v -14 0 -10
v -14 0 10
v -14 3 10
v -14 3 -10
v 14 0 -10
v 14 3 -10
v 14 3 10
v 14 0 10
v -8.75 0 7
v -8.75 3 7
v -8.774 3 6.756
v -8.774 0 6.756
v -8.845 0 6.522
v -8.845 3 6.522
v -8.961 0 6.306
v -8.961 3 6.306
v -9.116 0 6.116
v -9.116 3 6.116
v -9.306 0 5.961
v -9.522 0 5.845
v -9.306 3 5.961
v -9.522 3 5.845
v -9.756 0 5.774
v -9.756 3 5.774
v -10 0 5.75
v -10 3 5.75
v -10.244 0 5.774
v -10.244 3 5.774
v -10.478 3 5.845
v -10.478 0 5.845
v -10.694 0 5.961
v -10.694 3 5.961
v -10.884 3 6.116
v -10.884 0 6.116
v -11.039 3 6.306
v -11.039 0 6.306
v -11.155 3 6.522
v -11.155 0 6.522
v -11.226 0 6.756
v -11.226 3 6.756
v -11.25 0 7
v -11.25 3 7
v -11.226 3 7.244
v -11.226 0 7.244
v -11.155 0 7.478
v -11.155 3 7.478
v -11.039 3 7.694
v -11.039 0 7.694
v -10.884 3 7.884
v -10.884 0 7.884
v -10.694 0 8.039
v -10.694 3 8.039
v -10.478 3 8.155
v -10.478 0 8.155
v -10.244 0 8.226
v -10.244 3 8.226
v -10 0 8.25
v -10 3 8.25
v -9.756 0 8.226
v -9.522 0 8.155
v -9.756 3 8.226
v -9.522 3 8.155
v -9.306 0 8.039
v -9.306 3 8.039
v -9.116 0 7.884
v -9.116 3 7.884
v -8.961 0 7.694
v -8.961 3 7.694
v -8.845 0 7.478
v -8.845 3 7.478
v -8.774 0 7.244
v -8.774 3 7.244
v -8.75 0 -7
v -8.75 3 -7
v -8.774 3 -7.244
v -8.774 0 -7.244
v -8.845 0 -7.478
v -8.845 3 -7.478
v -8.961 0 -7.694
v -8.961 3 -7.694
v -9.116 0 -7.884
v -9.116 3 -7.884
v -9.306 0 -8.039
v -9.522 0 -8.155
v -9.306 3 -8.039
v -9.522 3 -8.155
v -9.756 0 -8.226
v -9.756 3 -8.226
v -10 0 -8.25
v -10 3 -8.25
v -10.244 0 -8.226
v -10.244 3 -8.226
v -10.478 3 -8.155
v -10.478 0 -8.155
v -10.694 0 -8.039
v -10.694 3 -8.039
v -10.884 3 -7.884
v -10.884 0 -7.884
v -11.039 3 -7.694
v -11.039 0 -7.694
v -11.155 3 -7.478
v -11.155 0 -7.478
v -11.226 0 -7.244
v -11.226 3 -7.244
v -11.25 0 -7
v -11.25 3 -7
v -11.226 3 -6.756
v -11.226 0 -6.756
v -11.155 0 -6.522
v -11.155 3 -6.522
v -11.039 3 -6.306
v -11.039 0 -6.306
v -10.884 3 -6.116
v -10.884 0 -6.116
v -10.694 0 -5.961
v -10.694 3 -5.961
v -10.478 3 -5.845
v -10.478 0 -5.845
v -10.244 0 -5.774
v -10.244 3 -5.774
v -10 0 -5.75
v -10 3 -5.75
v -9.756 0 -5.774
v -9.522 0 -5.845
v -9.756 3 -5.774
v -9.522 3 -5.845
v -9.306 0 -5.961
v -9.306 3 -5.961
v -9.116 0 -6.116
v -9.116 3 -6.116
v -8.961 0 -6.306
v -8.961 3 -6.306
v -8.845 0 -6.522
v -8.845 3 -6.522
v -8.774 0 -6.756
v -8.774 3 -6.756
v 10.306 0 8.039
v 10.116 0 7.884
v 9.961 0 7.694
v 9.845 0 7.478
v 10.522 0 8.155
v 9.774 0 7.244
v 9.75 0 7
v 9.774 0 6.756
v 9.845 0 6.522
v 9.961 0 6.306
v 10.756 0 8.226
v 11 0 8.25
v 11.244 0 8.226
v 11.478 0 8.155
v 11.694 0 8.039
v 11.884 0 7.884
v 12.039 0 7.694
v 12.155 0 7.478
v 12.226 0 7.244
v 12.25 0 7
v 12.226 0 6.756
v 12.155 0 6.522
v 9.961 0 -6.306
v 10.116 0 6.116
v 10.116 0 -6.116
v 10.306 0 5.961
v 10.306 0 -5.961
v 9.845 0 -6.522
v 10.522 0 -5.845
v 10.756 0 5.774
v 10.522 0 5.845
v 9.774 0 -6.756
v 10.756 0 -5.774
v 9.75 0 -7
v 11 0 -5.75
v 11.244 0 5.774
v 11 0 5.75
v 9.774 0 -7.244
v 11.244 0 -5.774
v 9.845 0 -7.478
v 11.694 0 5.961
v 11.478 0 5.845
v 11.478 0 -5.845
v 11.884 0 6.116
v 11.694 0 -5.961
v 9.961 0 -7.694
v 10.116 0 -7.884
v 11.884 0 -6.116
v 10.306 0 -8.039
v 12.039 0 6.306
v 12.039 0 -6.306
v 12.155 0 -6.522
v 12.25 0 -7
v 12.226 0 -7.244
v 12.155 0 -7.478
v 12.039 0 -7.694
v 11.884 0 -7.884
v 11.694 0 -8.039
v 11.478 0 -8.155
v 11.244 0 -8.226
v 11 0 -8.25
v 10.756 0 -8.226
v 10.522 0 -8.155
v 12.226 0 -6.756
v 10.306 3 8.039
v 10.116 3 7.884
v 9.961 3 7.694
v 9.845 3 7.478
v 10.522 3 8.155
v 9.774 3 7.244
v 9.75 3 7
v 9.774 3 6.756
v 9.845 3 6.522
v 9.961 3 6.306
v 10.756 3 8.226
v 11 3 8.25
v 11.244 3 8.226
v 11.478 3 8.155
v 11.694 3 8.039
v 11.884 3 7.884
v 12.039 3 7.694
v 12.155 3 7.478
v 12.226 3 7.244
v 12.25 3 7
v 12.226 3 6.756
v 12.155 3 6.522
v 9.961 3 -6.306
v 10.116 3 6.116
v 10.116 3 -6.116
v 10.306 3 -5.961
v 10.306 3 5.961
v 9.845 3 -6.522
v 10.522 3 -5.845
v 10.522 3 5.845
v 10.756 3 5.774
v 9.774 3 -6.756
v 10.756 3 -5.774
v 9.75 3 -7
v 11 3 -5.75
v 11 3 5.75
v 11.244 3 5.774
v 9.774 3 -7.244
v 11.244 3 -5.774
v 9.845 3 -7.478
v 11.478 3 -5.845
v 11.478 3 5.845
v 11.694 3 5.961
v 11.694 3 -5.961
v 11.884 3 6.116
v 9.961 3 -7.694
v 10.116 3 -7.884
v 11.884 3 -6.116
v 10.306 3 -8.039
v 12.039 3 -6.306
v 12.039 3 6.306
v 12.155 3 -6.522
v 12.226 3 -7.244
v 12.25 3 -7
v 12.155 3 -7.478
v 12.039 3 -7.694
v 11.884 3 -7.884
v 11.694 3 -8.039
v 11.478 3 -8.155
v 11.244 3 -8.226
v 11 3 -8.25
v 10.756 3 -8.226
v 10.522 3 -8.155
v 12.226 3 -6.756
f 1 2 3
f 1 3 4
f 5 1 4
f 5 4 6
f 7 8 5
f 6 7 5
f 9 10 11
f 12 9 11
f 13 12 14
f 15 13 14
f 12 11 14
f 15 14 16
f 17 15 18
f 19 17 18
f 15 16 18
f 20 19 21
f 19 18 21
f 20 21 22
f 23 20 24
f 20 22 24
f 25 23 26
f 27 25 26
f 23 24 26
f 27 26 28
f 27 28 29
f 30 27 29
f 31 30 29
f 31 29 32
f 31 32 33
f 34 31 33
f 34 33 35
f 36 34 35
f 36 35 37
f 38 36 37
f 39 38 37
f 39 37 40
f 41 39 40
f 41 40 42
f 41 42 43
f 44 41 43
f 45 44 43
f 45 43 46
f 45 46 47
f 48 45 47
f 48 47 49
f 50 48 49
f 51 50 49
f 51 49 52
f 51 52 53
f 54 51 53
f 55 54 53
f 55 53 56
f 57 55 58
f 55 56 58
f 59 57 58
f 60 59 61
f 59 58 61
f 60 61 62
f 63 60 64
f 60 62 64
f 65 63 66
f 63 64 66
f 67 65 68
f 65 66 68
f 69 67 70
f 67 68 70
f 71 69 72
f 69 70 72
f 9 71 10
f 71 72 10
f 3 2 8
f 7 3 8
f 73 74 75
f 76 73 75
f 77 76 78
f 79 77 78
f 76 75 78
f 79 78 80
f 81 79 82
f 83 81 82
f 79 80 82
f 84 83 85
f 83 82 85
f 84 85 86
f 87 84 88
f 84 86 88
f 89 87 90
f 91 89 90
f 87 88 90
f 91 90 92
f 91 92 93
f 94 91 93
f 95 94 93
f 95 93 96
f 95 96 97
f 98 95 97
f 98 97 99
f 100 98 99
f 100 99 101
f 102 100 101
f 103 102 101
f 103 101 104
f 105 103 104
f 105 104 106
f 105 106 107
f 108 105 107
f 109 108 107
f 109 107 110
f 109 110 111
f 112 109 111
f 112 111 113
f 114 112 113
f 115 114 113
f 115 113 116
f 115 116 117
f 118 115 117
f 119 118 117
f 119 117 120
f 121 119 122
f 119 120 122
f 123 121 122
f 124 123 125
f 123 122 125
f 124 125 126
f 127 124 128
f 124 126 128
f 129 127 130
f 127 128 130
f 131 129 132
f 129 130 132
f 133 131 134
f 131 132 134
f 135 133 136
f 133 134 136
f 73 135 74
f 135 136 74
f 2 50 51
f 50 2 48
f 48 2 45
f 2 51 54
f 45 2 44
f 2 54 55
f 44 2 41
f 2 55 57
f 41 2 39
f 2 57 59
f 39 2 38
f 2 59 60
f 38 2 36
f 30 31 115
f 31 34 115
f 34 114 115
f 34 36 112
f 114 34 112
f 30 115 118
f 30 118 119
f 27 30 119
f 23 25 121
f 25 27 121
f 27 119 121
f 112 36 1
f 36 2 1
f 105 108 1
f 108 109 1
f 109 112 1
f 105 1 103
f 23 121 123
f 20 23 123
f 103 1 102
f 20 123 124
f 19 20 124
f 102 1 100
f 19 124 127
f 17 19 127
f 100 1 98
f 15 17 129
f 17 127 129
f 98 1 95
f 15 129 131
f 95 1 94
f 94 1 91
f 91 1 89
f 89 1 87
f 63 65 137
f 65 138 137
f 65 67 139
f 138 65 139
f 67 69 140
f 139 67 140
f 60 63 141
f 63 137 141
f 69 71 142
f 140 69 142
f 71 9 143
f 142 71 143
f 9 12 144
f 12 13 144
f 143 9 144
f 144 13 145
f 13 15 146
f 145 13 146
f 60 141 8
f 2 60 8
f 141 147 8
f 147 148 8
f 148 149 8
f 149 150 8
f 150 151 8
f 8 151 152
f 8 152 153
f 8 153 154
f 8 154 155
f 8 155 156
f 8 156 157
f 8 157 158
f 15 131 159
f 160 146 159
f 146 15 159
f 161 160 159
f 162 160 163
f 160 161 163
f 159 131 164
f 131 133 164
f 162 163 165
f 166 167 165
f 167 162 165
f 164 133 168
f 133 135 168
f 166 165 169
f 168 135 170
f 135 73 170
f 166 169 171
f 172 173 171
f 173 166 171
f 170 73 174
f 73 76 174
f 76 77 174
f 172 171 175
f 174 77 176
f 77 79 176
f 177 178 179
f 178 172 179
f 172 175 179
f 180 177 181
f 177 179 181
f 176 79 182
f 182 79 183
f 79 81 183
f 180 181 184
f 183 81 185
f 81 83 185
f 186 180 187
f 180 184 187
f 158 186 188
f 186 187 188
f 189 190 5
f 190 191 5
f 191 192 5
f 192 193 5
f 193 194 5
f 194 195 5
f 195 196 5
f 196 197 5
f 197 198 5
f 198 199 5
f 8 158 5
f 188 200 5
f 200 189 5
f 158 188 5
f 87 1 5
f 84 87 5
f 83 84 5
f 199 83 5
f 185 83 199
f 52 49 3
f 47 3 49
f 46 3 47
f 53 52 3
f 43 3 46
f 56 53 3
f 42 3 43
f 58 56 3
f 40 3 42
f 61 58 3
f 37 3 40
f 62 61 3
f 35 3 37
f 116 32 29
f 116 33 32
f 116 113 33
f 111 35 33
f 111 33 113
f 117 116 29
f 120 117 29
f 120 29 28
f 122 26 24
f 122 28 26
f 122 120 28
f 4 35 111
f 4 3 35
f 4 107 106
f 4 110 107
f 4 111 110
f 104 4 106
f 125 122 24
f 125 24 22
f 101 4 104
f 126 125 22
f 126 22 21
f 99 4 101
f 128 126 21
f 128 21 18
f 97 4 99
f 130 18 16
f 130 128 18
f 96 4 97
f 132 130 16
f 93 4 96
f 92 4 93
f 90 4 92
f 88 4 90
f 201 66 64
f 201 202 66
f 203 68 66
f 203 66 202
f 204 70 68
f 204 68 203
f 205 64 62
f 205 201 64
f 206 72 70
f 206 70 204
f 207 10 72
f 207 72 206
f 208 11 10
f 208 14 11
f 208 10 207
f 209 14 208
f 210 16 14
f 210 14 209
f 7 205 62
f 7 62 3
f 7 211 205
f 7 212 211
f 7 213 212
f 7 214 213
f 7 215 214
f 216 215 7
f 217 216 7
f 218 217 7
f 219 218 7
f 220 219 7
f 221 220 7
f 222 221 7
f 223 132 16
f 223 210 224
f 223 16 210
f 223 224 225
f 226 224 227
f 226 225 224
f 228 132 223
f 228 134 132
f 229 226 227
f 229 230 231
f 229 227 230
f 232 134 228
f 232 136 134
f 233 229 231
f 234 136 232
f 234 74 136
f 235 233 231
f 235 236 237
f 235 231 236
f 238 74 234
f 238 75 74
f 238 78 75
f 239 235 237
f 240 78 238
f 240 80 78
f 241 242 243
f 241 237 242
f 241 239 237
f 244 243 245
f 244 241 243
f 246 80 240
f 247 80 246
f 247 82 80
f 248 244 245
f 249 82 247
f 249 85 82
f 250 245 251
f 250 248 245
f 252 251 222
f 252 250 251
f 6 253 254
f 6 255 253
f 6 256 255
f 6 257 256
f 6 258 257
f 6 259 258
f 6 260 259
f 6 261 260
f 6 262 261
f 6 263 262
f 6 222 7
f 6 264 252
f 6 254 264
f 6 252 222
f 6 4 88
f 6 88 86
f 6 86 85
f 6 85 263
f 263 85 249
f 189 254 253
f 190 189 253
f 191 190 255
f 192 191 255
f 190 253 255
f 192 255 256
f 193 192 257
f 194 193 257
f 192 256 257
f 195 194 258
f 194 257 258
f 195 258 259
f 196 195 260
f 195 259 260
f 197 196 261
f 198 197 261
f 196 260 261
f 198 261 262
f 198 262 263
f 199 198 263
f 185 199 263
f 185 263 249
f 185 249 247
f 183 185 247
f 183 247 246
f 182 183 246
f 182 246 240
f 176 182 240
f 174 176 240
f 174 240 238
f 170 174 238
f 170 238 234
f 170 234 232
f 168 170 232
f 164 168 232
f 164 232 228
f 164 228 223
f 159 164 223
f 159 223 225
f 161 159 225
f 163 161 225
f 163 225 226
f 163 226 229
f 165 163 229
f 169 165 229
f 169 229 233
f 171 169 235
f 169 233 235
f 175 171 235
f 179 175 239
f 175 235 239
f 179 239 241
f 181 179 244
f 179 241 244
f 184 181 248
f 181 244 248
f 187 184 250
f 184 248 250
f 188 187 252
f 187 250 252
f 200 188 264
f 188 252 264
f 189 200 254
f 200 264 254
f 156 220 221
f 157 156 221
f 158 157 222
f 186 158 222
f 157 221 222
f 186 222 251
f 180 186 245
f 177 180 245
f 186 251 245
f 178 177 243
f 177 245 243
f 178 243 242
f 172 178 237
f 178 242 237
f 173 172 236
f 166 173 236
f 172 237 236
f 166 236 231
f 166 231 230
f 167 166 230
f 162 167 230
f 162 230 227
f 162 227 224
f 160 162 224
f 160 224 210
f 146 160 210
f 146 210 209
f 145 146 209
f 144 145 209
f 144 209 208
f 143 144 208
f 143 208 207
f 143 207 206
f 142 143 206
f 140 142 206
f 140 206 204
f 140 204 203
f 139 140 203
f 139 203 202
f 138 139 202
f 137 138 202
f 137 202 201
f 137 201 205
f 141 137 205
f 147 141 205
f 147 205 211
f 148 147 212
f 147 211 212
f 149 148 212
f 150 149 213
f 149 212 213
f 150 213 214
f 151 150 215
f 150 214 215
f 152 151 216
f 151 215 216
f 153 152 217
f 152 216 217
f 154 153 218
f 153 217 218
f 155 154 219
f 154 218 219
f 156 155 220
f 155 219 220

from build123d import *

# Parameters (mm, degrees)
SKETCH1_W           = 28
SKETCH1_H           = 20
BOSS_EXTRUDE1_DEPTH = 3
M3_TAPPED_HOLE1_D   = 2.5


with BuildPart() as part:
    # Sketch1 → Boss-Extrude1 (new body)
    with BuildSketch(Plane(origin=(0, 0, 0), x_dir=(1, 0, 0), z_dir=(0, 1, 0))):
        Rectangle(SKETCH1_W, SKETCH1_H)
    extrude(amount=BOSS_EXTRUDE1_DEPTH)

    # M3 Tapped Hole1 (through all)
    with Locations(Plane(origin=(0, 0, 0), x_dir=(-1, 0, 0), z_dir=(0, -1, 0))):
        with Locations((-11, 7), (10, 7), (10, -7), (-11, -7)):
            Hole(M3_TAPPED_HOLE1_D / 2)


solid = part.part
